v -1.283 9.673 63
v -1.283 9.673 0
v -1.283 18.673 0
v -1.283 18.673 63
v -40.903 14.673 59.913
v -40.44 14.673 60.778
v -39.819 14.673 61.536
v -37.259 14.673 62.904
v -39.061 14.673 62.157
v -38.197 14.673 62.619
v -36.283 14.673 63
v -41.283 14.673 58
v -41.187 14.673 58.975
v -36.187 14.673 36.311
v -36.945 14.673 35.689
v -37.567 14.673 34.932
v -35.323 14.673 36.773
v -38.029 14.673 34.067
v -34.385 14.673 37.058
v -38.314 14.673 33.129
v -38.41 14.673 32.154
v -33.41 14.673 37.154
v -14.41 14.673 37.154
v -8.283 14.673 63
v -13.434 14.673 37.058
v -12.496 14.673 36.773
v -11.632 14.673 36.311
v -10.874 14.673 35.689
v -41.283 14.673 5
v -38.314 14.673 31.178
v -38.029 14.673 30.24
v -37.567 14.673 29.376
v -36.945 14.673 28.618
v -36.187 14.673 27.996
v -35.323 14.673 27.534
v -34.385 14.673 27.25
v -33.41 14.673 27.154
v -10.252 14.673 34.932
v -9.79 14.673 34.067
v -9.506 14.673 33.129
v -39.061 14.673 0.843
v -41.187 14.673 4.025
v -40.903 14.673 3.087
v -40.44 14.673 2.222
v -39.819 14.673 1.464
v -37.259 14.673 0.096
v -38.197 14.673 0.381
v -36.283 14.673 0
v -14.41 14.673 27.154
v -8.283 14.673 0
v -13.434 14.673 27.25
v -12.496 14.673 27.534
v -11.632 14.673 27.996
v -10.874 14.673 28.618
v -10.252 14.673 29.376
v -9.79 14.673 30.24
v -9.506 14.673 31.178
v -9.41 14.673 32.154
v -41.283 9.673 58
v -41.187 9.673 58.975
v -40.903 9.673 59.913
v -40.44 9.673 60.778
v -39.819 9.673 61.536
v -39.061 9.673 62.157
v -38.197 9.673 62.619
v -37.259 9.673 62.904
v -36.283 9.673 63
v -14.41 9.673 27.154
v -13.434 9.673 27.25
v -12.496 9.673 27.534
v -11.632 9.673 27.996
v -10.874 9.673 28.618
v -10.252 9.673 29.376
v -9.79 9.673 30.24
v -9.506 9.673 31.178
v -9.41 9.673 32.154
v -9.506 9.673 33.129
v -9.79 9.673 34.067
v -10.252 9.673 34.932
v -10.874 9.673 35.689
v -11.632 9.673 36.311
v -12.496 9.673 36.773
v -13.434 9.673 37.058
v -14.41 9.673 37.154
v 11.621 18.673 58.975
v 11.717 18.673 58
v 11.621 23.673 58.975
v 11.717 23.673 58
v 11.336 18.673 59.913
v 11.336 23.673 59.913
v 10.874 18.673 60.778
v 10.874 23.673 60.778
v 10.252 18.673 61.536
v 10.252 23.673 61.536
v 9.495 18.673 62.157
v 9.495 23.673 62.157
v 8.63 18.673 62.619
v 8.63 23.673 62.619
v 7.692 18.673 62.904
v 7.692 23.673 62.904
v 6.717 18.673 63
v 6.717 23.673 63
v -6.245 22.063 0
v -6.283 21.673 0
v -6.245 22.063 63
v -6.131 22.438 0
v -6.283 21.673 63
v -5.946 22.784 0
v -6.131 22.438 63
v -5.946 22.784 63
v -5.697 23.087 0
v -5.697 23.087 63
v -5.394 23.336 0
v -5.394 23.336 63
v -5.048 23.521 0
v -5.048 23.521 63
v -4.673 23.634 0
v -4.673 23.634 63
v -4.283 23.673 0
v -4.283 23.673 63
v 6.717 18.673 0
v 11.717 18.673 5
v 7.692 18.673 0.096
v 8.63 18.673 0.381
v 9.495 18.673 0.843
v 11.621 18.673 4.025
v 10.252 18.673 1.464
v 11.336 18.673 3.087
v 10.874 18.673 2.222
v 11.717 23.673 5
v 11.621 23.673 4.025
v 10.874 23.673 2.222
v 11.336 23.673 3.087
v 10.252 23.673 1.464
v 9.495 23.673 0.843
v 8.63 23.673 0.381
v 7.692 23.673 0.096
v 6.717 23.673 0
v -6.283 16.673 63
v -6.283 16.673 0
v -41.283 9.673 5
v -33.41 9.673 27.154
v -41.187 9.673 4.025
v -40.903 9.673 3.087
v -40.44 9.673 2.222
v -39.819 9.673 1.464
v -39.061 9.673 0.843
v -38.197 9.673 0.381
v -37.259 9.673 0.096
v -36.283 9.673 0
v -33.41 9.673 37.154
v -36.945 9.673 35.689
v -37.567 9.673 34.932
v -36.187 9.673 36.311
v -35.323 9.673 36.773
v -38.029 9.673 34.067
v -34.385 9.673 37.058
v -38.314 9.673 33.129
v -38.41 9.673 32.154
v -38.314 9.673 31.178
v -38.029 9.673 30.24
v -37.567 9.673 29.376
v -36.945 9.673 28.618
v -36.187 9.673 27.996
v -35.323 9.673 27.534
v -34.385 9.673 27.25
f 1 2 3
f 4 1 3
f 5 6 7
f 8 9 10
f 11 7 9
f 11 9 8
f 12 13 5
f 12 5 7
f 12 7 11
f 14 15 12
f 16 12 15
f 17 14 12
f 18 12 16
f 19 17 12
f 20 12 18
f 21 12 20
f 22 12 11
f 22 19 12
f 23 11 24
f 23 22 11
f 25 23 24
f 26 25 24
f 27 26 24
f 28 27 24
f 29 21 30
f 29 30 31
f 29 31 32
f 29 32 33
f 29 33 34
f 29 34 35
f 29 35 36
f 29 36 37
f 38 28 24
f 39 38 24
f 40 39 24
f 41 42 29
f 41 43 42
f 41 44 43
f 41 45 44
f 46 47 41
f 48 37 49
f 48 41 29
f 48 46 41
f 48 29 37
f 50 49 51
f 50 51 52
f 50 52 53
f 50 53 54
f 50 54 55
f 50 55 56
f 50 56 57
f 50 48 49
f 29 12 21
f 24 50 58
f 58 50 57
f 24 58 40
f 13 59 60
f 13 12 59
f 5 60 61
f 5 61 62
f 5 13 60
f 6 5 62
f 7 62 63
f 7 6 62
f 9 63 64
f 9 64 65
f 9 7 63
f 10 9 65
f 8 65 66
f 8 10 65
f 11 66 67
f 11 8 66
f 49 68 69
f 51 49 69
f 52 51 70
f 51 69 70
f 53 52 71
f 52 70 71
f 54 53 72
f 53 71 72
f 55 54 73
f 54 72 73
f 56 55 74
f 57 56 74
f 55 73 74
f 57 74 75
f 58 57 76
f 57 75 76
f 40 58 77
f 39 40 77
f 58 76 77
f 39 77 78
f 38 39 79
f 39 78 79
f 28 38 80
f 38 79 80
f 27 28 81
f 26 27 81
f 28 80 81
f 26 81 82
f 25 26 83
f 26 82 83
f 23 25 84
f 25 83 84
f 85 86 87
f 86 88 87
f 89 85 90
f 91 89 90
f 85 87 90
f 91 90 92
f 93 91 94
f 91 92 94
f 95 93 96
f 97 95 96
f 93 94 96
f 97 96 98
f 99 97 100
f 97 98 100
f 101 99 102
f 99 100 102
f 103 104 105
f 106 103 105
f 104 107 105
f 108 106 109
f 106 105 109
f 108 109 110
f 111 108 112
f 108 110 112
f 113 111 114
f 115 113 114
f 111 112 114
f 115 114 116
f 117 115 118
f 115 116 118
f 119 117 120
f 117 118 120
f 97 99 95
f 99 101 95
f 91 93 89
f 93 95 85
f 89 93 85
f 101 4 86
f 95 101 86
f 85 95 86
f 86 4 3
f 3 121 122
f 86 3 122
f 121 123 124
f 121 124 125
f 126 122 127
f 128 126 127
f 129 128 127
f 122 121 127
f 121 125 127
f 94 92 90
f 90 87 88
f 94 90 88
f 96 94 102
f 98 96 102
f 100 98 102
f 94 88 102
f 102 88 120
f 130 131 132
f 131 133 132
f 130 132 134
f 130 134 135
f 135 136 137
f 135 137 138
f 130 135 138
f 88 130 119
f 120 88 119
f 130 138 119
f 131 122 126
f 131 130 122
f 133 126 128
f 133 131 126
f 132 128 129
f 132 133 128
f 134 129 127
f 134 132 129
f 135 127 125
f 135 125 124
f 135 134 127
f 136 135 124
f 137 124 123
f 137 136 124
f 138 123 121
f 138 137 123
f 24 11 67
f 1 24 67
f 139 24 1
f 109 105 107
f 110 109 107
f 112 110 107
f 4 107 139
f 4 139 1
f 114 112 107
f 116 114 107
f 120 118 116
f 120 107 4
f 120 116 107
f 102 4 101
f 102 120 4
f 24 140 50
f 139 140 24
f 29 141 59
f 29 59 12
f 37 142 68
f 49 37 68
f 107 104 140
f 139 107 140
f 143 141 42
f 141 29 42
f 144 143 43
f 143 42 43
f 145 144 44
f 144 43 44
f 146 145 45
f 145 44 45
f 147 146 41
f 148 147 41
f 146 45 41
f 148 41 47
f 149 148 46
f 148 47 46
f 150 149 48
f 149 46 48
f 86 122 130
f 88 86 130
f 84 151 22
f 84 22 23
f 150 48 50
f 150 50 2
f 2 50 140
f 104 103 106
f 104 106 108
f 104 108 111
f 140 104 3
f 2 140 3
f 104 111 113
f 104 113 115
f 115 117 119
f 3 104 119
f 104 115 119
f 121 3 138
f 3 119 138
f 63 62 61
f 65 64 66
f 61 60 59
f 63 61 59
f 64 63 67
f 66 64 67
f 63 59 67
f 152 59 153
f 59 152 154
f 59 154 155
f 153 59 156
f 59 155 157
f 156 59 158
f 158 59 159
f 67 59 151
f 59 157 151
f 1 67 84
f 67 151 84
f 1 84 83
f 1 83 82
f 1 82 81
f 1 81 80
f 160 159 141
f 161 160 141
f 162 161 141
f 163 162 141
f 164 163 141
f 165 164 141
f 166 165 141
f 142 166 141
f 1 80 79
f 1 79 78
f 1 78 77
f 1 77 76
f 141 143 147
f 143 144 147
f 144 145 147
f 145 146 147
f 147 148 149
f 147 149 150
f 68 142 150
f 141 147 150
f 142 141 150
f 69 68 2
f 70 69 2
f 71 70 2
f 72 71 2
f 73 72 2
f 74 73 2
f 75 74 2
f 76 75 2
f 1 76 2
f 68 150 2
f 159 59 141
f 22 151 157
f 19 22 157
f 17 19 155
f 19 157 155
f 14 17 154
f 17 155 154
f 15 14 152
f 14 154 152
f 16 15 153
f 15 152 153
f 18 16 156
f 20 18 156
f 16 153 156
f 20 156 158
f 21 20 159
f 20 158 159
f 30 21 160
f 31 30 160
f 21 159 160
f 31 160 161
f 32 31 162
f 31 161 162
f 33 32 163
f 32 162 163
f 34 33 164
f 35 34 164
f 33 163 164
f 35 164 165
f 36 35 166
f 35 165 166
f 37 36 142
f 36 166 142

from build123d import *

# Parameters (mm, degrees)
F0_W     = 35
F0_H     = 5
F0_W_2   = 13
F0_W_3   = 5
F1_DEPTH = 63
F2_R     = 5
F3_W     = 19
F3_H     = 10
F4_DEPTH = 25
F5_SIZE  = 2
F6_R     = 2


with BuildPart() as f1:
    # F0 (on Top) → F1 (new body)
    with BuildSketch(Plane.XY):
        with Locations((-23.783123, 12.172864)):
            Rectangle(F0_W, F0_H)
        Polygon((-1.283123, 18.672864), (-6.283123, 18.672864), (-6.283123, 14.672864), (-6.283123, 9.672864), (-1.283123, 9.672864), align=None)
        with Locations((5.216877, 21.172864)):
            Rectangle(F0_W_2, F0_H)
        with Locations((-3.783123, 21.172864)):
            Rectangle(F0_W_3, F0_H)
    extrude(amount=F1_DEPTH)

    # F2
    f2_edges = [f1.edges().sort_by_distance(p)[0] for p in [
        (-41.283123, 12.172864, 63),
        (11.716877, 21.172864, 63),
        (-41.283123, 12.172864, 0),
        (11.716877, 21.172864, 0),
    ]]
    fillet(f2_edges, radius=F2_R)

    # F3 (on Front) → F4 (cut)
    with BuildSketch(Plane.XZ):
        with Locations((-23.909603, 32.153667)):
            Rectangle(F3_W, F3_H)
        with BuildLine():
            Line((-14.409603, 37.153667), (-14.409603, 27.153667))
            ThreePointArc((-14.409603, 27.153667), (-9.409603, 32.153667), (-14.409603, 37.153667))
        make_face()
        with BuildLine():
            ThreePointArc((-33.409603, 37.153667), (-38.409603, 32.153667), (-33.409603, 27.153667))
            Line((-33.409603, 27.153667), (-33.409603, 37.153667))
        make_face()
    extrude(amount=-F4_DEPTH, mode=Mode.SUBTRACT)

    # F5
    f5_edges = [f1.edges().sort_by_distance(p)[0] for p in [
        (-6.283123, 14.672864, 31.5),
    ]]
    chamfer(f5_edges, length=F5_SIZE)

    # F6
    f6_edges = [f1.edges().sort_by_distance(p)[0] for p in [
        (-6.283123, 23.672864, 31.5),
    ]]
    fillet(f6_edges, radius=F6_R)


solid = f1.part
